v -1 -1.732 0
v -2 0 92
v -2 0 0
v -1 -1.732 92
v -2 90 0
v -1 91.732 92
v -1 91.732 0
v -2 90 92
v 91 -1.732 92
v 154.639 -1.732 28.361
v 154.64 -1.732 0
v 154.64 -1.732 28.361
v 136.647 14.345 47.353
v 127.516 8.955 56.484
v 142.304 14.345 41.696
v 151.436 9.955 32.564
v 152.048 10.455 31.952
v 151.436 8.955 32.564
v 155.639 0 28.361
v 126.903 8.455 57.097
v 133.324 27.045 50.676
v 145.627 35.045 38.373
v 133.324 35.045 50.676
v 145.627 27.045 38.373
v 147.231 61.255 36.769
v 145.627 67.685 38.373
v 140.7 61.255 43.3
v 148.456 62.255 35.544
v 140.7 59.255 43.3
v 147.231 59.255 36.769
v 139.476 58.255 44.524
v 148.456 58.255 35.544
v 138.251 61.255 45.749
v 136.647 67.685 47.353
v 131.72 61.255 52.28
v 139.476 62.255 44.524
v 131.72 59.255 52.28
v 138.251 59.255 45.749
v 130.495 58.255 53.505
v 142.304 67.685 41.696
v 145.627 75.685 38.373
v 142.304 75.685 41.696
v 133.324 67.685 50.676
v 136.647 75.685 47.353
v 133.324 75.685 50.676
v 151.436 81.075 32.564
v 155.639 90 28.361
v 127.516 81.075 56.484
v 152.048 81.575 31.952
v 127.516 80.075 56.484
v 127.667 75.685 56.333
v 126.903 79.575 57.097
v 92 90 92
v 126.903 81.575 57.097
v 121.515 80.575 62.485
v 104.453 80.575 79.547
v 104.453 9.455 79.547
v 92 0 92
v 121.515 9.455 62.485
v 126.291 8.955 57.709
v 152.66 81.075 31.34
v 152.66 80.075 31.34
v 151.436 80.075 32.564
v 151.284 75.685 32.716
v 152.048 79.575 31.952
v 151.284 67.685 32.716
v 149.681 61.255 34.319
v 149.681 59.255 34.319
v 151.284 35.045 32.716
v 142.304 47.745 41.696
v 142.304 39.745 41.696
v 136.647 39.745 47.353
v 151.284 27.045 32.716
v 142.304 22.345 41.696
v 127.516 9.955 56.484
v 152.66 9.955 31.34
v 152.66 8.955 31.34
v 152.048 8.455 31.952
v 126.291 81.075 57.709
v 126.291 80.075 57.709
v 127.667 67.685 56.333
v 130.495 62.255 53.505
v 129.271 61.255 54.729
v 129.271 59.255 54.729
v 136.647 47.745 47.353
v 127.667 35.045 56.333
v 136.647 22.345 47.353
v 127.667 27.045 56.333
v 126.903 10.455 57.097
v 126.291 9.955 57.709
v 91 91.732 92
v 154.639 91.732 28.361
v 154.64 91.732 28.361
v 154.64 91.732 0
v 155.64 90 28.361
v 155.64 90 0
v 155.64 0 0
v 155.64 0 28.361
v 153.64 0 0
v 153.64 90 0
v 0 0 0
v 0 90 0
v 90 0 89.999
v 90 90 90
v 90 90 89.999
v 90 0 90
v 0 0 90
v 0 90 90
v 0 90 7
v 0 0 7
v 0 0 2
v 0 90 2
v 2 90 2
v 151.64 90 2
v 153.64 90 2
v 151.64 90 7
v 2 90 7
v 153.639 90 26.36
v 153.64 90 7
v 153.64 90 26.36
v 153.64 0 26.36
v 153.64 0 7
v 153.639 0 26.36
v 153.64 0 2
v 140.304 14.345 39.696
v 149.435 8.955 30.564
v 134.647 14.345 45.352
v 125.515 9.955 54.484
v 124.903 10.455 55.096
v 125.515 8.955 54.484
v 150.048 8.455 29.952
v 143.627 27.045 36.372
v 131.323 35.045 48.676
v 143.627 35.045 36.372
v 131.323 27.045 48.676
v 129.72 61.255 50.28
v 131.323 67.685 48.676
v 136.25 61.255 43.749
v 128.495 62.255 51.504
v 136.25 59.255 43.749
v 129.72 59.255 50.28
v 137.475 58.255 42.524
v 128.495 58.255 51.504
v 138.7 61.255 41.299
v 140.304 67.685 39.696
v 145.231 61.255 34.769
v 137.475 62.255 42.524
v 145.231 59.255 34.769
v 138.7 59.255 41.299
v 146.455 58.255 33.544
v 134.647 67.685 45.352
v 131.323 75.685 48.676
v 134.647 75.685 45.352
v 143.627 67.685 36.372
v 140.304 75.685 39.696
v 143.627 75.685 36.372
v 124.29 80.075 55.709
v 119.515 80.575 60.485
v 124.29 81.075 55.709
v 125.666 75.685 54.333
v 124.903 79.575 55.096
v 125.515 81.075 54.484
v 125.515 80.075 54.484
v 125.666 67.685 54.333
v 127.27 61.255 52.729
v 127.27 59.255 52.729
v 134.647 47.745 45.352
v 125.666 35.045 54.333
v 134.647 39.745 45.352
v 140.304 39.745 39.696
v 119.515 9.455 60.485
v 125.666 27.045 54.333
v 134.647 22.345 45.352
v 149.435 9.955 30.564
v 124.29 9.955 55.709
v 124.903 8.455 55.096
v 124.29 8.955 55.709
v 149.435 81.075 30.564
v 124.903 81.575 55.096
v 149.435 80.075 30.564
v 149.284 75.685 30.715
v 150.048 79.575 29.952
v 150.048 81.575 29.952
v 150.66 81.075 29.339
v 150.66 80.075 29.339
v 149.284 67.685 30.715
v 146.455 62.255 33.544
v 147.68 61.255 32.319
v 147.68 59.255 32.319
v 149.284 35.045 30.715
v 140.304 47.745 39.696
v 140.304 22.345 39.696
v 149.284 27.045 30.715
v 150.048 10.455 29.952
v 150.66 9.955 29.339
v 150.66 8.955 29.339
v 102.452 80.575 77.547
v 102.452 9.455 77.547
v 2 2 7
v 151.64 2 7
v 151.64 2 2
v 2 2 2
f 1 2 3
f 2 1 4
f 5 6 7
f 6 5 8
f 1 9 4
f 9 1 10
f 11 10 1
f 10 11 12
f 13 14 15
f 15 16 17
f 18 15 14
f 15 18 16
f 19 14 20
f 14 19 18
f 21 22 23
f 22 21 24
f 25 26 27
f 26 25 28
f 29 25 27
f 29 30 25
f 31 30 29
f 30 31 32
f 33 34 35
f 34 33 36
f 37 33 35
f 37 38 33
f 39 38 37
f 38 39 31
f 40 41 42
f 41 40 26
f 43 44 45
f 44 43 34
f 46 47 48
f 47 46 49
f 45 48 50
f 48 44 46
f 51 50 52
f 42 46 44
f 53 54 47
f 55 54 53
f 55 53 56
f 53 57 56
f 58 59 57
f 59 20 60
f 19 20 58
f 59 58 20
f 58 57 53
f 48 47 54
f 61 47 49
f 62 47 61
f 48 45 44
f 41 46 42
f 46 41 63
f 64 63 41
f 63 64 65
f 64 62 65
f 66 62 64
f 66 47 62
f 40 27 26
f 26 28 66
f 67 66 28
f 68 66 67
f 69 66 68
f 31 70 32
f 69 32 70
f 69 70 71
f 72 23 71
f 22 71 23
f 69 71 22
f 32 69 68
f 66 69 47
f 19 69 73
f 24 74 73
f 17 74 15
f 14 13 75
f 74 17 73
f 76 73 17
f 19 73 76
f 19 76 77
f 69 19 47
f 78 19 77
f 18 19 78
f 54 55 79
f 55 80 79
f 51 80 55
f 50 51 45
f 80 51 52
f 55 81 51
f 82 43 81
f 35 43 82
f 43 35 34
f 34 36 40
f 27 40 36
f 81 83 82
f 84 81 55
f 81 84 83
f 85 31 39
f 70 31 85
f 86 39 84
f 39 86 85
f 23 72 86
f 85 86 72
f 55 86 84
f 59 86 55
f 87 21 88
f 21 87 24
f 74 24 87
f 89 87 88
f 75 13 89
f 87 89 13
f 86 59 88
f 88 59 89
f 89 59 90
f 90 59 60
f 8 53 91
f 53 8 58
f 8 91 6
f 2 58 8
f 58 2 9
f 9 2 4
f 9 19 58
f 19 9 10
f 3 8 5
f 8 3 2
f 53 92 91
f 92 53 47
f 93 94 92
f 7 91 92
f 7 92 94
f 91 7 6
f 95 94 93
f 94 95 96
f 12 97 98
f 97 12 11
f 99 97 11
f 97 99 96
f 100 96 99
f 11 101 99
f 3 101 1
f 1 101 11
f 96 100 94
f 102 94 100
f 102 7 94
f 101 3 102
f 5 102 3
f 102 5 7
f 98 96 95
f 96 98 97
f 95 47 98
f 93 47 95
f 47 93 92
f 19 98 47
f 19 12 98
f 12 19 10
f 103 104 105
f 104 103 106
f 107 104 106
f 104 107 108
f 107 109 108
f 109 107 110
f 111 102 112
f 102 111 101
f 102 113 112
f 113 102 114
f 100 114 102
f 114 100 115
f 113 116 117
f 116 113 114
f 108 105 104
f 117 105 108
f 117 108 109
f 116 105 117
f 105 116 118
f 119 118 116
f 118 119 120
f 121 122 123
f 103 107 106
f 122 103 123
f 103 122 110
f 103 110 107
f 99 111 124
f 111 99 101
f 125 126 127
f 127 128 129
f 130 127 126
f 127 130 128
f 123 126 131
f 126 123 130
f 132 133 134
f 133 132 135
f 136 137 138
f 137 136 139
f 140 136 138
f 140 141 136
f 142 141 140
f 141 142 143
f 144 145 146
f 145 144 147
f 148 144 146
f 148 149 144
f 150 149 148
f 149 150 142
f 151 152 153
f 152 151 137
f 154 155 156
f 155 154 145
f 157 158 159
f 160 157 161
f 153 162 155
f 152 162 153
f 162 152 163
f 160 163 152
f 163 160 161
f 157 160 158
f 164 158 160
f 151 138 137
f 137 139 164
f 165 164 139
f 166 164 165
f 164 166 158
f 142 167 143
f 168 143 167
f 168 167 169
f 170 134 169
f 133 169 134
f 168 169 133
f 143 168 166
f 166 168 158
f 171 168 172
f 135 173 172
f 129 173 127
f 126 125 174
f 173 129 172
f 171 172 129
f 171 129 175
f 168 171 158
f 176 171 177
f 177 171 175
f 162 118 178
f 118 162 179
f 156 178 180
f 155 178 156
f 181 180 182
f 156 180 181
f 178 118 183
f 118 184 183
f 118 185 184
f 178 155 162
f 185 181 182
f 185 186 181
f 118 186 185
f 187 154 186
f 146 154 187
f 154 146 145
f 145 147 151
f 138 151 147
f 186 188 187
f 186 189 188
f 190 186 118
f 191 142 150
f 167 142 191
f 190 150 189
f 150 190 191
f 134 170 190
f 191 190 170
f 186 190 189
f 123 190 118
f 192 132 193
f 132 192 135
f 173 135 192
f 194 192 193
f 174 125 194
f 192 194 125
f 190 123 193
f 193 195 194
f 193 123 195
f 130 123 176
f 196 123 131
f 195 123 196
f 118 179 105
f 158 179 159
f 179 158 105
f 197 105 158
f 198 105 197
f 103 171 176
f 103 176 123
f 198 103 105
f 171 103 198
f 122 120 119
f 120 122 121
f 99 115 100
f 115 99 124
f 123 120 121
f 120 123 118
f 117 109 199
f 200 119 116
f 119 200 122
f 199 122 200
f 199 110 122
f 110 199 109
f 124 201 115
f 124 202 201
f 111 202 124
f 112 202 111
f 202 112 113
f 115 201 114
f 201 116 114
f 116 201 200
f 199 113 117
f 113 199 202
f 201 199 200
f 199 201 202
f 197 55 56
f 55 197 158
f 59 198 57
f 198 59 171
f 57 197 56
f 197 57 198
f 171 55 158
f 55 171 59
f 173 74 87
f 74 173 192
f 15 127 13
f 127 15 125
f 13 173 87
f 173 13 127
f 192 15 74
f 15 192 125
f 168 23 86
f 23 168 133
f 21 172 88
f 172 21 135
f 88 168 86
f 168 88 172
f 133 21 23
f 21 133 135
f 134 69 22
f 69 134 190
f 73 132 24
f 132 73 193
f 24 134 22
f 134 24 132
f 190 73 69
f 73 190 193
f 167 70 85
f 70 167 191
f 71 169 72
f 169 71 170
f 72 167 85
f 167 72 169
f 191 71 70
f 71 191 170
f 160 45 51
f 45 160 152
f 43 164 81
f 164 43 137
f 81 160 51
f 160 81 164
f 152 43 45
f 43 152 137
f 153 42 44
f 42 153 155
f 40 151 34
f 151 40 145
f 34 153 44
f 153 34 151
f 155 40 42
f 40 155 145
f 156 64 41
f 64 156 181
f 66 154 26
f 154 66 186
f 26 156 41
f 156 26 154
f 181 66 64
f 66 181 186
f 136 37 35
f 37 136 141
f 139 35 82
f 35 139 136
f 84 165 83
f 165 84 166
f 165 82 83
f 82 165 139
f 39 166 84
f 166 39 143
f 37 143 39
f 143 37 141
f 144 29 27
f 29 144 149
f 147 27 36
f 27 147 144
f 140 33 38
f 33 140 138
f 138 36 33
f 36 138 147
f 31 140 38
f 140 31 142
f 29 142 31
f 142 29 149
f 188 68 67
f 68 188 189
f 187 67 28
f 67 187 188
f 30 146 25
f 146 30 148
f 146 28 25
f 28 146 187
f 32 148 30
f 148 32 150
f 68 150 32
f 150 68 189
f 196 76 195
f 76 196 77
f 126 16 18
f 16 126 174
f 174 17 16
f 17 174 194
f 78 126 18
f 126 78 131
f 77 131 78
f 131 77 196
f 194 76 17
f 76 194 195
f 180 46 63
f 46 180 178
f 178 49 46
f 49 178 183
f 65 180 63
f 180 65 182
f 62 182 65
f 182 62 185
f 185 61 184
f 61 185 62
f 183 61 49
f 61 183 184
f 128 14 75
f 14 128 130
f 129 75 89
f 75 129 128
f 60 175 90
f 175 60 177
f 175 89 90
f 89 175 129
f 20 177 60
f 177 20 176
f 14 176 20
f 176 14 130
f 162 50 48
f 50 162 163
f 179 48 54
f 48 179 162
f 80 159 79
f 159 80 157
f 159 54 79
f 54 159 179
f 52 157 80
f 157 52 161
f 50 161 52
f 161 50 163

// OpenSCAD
$fn=6;
dot=.5*2.54; // 1/20th of an inch

module hole_button(x, y) {
	translate([x*dot, y*dot, 0]) cube([8, 8, 10], center=true);
}

module hole_led(x, y) {
	translate([x*dot, y*dot, 0]) cylinder(r=2,5, h=10, center=true);
}

module hole_screw(x, y) {
	translate([x*dot, y*dot, 0]) cylinder(r=1,5, h=10, center=true);
}

module holes() {
	translate([32*dot, 47.5*dot, 0]) cube([56*dot, 19*dot, 10], center=true);	// display
	
	hole_button(11, 18);	// cursor left
	hole_button(21, 28);	// cursor up
	hole_button(21, 8);		// cursor down
	hole_button(31, 18);	// cursor right

	hole_button(53, 28);	// fn right top
	hole_button(53, 18);	// fn right middle
	hole_button(53, 8);		// fn right bottom

	hole_led(44, 28);		// led top
	hole_led(44, 18);		// led middle
	hole_led(44, 8);			// led bottom

	hole_screw(4, 4);		// screw left bottom
	hole_screw(60, 4);		// screw right bottom
	hole_screw(4, 32);		// screw left top
	hole_screw(60, 32);		// screw right top
}

difference() {
	union() {
		difference() {
			minkowski(){
				difference() {
					cube([153.64, 90, 90]);
					translate([90,0,90]) rotate([0, 45, 0]) cube([90, 90, 90]);
				}
				cylinder(h=2, r=2);
			}
			// remove interior
			cube([90, 90, 90]);
			translate([26.36, 0, 26.36]) rotate([0, 45, 0]) cube([90, 90, 90]);
			translate([90,0,0]) cube([63.64, 90, 26.36]);
		}
		// add 2 mm ridge for bottom support
		difference() {
			translate([0, 0, 2]) cube([153.64, 90, 5]);
			translate([2, 2, 2]) cube([149.64, 88, 5]);
		}
	}
	// remove holes for display, buttons and leds
	translate([153.64, 4.375 ,26.36]) rotate([45, 0, 90]) holes();
}
